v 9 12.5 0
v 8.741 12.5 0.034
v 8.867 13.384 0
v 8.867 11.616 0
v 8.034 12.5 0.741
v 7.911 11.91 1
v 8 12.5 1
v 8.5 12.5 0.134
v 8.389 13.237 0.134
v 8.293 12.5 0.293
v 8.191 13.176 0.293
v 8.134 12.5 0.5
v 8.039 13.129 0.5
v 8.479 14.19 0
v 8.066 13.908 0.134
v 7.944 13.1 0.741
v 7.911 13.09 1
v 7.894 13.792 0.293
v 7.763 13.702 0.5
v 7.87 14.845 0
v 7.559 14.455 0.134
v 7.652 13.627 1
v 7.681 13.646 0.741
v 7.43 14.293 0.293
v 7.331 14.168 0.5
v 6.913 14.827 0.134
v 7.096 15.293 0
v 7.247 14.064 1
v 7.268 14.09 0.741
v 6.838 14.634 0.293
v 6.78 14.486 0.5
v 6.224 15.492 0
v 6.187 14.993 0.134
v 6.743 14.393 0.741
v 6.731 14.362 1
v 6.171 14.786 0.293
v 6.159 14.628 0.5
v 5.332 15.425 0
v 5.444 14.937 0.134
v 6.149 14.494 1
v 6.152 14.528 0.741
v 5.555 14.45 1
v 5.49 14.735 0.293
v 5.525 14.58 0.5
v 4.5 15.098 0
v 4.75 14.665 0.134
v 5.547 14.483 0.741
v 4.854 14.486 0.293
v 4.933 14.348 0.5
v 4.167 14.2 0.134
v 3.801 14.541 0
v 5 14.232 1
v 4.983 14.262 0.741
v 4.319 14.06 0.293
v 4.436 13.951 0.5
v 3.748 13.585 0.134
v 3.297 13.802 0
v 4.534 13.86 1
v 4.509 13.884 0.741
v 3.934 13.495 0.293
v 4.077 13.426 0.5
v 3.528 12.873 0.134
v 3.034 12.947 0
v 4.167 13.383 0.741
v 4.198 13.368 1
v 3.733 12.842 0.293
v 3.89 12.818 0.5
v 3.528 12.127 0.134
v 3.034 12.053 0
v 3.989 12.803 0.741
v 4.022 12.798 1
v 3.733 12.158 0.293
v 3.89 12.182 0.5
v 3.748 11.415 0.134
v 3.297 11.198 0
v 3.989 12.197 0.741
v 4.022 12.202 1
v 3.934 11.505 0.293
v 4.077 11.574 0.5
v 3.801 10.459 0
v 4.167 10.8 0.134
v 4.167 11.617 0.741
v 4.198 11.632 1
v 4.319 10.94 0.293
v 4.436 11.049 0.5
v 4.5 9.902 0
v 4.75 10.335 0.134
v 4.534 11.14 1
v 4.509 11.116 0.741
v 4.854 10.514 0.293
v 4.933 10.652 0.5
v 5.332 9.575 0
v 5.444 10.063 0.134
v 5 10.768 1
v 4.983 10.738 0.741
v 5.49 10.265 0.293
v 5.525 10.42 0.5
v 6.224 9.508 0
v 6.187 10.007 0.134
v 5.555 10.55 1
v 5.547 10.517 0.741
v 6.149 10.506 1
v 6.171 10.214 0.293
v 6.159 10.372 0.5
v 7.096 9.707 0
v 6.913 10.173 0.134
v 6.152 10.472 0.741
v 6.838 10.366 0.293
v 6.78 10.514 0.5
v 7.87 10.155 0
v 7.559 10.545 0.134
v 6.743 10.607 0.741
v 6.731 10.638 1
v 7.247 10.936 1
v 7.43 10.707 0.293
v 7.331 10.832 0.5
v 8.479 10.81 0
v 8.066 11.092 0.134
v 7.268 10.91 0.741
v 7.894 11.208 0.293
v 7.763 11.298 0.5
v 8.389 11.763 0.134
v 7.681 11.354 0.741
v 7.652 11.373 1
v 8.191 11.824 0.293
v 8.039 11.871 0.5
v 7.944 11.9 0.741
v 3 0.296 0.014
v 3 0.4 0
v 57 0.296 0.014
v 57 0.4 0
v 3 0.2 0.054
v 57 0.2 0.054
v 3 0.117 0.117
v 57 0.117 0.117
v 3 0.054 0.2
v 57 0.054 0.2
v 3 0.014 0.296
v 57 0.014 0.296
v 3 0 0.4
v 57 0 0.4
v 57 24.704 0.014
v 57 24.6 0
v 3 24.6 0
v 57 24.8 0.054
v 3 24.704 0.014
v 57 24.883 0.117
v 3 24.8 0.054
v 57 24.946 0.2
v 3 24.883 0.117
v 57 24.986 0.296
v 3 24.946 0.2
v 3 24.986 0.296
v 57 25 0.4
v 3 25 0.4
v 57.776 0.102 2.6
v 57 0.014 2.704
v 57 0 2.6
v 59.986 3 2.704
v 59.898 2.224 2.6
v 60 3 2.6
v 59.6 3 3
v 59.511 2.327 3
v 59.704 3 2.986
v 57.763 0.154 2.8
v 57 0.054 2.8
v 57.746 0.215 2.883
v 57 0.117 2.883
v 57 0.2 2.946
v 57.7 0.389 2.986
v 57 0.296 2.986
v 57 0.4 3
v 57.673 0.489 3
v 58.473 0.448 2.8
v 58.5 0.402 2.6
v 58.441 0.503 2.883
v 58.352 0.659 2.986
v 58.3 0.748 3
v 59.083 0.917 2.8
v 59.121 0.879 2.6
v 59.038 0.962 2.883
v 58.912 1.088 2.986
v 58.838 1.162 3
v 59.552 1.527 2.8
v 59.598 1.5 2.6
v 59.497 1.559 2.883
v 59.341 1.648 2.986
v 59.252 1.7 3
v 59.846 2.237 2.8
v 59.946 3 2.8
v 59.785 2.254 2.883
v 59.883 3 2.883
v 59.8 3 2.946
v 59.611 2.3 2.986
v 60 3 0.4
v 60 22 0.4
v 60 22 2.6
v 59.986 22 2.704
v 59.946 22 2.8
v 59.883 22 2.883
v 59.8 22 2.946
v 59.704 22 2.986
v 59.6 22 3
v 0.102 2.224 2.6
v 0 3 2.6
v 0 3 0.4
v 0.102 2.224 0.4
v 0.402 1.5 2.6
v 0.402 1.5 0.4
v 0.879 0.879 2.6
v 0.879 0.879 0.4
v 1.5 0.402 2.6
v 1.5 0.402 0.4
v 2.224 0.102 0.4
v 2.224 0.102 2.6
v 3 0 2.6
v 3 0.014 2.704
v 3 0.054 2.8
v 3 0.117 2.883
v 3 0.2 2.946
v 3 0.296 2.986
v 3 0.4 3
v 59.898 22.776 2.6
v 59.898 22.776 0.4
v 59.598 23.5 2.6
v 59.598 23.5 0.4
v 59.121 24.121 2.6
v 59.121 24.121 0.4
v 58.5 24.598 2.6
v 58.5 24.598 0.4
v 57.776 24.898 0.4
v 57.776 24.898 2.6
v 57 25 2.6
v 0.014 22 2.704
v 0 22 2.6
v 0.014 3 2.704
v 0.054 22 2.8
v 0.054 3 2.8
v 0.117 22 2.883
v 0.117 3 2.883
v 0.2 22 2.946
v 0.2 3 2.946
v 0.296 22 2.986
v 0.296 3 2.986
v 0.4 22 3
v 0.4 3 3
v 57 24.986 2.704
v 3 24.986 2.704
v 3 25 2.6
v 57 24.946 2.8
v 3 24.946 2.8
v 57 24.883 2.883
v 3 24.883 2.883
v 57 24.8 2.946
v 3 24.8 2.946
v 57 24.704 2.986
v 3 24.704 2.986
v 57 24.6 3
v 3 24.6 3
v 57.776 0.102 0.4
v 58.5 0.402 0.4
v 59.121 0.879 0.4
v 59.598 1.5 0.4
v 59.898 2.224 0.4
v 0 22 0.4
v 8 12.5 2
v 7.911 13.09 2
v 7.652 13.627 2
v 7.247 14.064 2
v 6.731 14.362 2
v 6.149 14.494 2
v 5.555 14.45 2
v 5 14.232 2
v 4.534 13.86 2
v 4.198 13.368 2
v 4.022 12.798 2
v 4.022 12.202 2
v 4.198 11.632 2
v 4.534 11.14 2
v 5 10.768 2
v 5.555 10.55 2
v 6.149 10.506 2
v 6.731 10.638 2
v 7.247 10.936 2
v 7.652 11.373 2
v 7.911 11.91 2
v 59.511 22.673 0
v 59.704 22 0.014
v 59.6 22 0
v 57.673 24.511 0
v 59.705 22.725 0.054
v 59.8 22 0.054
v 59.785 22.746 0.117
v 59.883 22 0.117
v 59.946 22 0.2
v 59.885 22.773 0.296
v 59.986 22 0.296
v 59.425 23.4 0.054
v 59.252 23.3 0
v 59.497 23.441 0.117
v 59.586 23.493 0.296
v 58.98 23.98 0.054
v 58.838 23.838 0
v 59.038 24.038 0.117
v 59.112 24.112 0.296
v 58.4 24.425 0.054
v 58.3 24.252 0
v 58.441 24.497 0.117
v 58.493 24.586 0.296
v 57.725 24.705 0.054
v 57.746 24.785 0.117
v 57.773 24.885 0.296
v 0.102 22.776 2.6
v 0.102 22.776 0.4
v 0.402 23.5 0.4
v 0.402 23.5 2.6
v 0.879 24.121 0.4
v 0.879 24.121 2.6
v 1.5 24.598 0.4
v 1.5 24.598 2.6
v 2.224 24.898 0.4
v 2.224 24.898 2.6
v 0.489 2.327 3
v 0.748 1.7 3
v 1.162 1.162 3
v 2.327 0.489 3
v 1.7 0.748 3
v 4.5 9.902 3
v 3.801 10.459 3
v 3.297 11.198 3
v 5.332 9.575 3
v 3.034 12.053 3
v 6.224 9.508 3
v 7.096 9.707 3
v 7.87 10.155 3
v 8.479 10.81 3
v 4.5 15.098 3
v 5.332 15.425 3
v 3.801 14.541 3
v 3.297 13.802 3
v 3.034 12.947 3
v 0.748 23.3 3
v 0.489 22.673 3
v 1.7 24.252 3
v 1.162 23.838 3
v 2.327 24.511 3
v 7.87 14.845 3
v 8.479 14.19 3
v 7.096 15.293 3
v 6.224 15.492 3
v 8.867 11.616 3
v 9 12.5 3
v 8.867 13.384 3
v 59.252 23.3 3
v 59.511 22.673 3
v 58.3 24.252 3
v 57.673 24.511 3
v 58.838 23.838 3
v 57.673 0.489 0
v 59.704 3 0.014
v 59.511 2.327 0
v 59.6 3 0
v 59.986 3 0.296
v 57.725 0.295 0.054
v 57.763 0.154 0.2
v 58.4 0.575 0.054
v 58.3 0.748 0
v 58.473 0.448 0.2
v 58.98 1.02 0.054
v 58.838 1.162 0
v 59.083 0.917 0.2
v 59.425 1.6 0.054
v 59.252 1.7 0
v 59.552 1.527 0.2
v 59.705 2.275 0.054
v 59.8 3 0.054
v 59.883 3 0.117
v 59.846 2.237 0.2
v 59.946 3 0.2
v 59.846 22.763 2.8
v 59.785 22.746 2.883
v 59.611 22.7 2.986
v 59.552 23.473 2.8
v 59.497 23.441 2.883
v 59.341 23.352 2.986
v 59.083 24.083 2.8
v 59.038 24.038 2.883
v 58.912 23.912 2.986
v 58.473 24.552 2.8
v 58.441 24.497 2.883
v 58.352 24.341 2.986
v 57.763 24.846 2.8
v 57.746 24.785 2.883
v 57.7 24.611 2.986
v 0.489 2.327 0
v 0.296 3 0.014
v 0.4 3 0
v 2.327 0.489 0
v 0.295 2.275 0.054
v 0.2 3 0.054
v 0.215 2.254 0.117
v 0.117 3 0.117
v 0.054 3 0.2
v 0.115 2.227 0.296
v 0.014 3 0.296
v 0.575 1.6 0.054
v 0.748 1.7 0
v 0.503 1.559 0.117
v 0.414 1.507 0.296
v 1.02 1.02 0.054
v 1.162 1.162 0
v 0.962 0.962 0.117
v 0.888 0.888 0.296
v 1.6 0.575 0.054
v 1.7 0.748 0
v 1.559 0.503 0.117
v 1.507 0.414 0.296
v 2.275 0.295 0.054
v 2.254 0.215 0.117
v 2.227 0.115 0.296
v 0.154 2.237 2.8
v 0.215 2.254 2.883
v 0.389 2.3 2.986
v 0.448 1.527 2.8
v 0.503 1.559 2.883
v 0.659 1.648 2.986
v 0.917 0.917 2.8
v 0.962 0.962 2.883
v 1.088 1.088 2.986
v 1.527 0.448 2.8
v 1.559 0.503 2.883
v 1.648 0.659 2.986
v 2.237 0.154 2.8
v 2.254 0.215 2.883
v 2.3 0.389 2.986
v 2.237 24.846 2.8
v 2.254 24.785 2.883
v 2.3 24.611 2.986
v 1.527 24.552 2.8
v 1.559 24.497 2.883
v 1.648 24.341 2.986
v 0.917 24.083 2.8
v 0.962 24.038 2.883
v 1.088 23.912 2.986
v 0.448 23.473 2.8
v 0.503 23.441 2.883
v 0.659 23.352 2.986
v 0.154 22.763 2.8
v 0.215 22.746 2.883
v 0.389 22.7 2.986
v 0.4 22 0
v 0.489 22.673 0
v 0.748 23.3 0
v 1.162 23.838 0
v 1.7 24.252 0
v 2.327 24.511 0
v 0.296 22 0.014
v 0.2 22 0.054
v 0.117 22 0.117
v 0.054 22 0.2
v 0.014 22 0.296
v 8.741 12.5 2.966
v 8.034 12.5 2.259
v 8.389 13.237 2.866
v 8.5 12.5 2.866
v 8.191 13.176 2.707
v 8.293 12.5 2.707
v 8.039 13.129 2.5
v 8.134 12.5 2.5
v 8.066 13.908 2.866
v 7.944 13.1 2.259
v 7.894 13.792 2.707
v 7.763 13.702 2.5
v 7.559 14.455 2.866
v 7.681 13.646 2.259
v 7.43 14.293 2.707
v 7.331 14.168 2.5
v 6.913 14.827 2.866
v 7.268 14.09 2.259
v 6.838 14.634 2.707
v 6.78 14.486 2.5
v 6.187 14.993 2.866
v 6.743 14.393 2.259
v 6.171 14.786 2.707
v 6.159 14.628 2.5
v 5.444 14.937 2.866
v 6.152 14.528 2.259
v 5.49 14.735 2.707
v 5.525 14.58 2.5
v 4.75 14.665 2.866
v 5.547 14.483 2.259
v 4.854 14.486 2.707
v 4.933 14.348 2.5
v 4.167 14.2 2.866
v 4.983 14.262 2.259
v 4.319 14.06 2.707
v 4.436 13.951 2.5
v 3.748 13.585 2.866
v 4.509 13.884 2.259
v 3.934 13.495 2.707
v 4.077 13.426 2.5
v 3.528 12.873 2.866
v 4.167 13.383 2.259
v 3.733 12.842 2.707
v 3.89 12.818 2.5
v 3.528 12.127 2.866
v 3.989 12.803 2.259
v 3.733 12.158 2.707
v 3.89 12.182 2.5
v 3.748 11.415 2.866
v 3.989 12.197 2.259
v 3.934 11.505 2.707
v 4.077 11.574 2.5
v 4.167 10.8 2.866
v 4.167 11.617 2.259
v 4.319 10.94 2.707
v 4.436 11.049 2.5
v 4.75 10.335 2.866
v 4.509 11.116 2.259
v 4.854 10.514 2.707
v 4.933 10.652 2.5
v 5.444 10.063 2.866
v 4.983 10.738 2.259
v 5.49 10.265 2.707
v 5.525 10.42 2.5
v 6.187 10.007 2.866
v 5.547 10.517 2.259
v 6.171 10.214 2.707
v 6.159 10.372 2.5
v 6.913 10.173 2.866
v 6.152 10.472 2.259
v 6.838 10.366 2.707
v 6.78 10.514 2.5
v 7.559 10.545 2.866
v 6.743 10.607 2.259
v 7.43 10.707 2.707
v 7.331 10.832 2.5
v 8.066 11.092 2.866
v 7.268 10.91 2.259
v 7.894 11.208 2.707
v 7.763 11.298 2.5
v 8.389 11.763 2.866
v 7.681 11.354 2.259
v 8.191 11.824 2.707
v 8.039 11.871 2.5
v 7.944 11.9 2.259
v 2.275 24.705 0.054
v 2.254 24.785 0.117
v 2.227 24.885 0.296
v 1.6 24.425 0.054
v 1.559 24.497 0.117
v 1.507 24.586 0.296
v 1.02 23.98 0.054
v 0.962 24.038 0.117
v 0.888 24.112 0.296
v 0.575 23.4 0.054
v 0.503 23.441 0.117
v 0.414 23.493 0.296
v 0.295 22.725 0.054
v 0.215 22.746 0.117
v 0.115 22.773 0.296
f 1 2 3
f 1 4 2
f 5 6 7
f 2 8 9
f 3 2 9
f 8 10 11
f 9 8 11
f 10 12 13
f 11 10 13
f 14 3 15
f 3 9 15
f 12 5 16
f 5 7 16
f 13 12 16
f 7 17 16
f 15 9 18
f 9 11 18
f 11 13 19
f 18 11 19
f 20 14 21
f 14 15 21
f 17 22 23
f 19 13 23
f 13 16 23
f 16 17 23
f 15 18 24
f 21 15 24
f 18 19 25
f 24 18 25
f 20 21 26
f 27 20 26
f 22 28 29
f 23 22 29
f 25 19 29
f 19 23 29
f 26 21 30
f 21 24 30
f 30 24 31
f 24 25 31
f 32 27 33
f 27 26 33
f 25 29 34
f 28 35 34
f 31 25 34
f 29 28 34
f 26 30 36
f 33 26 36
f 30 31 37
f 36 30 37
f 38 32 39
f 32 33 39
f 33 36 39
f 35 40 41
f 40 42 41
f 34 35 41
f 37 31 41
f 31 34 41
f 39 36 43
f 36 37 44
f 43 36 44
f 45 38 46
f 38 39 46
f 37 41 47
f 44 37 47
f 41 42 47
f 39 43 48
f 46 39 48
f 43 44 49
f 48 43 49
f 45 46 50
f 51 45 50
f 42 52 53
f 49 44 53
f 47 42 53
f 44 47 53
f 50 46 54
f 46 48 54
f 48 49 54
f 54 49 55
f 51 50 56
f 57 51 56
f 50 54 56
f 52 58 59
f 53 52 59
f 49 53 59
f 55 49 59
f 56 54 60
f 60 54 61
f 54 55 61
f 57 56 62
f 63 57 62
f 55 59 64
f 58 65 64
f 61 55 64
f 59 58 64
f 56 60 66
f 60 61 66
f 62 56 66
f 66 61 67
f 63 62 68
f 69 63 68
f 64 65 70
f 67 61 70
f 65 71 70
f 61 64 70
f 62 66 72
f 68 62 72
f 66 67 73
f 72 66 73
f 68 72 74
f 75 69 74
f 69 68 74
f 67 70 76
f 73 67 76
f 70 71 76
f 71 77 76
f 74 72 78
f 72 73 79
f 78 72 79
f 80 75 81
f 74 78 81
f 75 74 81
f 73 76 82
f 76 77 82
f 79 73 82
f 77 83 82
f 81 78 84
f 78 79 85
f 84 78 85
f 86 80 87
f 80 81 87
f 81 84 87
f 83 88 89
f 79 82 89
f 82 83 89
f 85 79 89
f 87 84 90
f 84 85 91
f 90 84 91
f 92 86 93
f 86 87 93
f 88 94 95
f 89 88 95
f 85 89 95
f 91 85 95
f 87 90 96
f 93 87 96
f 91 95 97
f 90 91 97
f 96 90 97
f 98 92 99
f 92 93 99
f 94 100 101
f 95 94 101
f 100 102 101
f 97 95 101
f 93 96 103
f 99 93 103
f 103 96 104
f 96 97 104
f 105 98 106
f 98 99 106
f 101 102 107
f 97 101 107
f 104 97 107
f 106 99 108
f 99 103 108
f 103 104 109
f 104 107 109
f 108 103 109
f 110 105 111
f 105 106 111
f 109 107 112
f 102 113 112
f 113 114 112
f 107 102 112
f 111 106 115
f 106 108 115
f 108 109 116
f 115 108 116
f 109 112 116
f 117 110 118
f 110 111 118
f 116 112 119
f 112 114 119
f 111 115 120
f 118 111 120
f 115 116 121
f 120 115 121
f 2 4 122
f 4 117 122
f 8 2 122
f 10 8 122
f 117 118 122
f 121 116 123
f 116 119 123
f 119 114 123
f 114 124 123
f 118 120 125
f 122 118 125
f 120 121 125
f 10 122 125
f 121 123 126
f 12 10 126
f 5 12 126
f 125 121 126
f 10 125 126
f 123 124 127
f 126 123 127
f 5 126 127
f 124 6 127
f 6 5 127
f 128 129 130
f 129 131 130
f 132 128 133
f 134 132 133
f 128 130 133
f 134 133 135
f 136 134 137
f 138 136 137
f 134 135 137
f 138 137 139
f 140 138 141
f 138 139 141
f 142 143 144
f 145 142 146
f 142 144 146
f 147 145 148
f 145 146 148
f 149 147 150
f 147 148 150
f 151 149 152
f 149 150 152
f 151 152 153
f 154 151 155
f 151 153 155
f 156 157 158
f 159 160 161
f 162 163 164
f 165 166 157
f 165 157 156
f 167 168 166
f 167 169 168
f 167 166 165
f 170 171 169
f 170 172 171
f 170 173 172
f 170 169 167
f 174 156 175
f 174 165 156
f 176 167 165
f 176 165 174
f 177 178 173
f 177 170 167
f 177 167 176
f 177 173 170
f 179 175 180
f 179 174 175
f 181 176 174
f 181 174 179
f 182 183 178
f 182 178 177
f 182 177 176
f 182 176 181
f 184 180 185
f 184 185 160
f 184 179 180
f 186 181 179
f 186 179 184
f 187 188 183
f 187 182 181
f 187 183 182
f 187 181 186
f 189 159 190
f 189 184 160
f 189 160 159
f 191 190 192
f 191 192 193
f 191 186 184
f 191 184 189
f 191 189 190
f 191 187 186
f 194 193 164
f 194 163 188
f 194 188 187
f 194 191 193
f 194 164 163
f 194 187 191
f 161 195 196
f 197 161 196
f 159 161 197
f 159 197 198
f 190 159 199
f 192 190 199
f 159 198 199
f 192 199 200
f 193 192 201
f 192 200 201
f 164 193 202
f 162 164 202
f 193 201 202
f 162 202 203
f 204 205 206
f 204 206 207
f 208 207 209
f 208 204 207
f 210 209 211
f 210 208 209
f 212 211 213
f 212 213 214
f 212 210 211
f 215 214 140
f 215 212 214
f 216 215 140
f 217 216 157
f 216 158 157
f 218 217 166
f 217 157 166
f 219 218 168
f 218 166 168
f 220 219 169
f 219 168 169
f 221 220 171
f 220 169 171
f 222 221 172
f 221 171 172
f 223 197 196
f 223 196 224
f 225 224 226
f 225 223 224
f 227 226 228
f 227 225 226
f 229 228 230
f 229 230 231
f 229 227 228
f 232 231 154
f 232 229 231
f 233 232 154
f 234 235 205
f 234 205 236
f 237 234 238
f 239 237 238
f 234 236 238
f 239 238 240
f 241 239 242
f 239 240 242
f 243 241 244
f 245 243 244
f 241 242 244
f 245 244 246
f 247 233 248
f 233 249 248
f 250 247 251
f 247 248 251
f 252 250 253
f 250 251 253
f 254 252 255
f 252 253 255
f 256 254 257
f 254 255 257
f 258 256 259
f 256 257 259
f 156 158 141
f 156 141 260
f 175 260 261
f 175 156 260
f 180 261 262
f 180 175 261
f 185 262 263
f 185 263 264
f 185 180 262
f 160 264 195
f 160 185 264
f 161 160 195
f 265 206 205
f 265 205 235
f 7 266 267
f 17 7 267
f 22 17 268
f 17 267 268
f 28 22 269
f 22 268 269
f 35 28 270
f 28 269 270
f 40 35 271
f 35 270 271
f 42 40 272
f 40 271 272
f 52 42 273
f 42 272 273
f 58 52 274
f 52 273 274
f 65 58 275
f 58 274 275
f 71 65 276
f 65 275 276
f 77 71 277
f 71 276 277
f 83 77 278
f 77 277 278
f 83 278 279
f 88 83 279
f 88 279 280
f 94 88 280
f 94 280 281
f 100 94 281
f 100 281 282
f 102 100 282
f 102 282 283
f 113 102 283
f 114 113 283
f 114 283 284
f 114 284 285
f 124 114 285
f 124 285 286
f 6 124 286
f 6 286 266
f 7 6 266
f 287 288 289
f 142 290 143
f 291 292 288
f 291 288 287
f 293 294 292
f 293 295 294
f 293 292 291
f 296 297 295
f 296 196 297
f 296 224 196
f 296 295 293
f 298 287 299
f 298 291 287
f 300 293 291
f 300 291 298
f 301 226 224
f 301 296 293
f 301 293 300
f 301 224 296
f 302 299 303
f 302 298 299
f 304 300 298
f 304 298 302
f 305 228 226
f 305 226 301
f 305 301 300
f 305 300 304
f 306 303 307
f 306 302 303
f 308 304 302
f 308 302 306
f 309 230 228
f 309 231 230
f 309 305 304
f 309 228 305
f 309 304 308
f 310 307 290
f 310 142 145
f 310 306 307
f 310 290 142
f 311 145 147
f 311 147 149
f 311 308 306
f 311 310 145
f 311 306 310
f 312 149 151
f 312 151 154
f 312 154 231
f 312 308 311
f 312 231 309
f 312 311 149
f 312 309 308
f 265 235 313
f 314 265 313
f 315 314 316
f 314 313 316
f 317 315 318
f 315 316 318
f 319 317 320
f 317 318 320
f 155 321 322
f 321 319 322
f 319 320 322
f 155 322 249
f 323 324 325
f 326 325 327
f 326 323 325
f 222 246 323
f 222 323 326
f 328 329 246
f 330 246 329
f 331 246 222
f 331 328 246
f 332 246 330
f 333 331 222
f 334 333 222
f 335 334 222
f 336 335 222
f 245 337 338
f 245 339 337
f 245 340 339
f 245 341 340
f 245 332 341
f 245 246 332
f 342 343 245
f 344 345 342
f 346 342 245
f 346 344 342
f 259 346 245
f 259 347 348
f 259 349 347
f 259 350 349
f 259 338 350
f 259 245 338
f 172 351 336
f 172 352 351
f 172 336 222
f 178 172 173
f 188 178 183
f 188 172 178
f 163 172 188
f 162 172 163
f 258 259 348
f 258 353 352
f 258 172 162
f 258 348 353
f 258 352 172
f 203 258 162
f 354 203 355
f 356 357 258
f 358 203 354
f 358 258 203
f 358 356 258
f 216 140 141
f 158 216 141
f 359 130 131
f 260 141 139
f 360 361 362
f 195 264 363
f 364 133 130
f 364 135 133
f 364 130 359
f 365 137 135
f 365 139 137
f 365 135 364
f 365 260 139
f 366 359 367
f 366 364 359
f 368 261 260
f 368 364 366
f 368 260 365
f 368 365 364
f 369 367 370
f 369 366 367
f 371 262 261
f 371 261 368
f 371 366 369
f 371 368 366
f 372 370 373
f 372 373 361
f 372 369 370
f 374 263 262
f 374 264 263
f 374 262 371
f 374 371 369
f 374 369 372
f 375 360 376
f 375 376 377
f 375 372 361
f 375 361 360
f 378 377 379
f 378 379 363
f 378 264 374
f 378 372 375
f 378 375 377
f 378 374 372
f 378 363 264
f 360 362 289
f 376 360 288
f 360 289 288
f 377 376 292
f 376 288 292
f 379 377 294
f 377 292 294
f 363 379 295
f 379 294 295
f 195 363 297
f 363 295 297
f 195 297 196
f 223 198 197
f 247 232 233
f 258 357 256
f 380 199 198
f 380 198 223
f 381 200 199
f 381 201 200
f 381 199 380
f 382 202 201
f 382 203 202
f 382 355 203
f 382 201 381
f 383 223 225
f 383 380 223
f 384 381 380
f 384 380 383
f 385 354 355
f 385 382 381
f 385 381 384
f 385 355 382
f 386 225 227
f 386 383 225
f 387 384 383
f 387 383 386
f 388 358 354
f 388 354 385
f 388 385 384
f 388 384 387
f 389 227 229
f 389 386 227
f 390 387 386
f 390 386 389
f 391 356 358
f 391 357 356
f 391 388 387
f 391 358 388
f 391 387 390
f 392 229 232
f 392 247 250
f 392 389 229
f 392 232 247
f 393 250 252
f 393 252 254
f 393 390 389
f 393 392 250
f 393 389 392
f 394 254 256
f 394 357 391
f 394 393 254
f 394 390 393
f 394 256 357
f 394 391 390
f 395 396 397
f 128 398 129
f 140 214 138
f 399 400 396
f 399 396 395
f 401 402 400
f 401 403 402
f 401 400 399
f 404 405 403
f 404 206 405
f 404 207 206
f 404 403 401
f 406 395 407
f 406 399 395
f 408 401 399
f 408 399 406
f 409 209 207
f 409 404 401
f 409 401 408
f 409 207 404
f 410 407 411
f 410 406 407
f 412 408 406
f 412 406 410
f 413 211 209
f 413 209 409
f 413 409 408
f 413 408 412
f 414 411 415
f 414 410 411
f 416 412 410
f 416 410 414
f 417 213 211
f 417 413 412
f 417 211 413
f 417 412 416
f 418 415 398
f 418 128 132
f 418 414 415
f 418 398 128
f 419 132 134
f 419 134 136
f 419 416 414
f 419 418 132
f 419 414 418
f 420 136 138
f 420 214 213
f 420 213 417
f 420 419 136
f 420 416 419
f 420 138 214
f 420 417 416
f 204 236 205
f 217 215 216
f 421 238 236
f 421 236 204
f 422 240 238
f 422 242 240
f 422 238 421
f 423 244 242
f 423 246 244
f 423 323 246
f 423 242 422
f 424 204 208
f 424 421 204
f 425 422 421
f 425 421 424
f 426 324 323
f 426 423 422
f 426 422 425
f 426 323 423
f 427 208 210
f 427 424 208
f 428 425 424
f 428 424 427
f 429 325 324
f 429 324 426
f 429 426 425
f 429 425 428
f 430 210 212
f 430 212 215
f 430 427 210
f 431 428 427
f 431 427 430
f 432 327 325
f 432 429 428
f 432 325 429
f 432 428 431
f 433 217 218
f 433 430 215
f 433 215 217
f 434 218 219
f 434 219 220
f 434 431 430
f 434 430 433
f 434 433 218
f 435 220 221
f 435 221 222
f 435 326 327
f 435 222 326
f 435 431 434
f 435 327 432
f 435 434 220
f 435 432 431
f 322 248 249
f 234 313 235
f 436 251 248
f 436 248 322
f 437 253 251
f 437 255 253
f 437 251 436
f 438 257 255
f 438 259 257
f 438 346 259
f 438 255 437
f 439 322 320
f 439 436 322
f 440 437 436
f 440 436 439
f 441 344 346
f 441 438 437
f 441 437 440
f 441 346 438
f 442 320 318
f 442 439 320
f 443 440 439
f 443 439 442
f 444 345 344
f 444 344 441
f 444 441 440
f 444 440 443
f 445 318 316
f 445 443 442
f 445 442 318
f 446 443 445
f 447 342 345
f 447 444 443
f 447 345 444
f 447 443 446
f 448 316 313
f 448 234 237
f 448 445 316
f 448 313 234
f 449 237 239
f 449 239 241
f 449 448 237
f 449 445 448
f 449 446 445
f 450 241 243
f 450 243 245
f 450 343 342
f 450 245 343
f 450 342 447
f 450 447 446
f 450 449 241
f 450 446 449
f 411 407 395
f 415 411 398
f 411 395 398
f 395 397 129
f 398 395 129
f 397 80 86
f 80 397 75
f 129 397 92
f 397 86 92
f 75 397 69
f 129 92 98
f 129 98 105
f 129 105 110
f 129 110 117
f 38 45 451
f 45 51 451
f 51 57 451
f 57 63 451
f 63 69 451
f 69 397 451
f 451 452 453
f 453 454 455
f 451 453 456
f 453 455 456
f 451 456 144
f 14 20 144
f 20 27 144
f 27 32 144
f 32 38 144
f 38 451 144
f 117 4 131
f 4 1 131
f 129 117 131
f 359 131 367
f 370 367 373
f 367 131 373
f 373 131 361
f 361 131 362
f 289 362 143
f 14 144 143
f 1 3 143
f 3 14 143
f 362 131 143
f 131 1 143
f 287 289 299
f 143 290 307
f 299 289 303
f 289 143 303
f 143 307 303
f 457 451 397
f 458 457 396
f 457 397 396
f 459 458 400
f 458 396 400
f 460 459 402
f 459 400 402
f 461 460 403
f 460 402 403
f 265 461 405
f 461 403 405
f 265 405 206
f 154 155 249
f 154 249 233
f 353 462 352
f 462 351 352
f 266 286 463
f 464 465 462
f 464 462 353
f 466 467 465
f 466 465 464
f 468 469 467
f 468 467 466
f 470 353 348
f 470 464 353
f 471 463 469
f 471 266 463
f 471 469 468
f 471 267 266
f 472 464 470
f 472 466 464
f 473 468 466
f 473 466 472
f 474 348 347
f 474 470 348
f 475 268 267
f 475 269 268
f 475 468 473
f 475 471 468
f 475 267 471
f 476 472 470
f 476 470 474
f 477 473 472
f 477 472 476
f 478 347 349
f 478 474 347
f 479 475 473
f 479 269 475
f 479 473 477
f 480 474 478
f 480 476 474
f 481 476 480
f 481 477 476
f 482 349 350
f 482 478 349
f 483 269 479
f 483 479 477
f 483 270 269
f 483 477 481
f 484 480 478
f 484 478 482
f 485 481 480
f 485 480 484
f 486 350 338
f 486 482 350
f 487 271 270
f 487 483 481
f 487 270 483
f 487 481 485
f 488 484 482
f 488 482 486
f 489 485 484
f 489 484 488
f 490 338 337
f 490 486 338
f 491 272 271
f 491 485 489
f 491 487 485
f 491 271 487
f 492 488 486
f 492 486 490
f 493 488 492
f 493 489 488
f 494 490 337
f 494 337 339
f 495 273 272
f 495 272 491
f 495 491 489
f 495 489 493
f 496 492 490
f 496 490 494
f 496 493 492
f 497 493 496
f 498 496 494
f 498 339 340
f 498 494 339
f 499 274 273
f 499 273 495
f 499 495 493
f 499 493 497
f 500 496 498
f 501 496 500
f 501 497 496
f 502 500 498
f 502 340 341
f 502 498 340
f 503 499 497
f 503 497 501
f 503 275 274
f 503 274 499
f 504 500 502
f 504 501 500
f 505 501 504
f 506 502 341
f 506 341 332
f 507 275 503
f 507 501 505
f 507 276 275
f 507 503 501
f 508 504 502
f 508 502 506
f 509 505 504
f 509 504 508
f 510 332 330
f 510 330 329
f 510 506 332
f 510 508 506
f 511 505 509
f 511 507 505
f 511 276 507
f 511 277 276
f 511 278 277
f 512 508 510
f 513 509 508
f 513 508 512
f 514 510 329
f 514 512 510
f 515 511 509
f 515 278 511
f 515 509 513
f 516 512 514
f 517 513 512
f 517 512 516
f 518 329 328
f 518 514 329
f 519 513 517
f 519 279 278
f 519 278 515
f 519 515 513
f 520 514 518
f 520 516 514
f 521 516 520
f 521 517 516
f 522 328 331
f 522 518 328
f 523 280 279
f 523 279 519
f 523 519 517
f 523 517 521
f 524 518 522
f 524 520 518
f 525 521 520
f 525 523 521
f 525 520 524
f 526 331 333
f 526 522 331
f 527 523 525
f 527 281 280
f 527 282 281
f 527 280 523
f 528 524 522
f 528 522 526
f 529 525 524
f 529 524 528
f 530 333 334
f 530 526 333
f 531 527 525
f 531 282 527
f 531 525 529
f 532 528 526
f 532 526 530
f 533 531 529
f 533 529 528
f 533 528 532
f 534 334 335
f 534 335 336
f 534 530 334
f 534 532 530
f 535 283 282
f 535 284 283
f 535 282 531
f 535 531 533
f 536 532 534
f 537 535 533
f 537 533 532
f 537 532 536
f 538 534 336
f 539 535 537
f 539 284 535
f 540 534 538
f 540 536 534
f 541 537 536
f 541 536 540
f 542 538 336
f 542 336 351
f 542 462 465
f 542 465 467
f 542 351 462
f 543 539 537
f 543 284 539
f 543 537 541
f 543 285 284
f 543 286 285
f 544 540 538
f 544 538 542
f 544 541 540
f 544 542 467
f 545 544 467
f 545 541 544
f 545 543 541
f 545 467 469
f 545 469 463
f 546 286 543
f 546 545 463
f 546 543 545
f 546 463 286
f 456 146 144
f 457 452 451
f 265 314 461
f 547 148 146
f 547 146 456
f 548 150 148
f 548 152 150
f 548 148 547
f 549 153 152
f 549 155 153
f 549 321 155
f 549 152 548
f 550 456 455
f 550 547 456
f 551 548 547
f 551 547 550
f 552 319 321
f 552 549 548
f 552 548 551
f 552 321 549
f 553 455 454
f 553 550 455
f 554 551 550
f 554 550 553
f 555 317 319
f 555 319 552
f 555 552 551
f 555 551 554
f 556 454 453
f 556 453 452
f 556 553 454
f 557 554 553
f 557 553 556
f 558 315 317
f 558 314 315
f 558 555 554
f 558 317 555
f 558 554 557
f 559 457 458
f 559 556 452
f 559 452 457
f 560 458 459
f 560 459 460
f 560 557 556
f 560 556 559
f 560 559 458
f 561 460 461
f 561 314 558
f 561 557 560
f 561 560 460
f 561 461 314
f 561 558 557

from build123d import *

# Parameters (mm, degrees)
SKETCH_W      = 60
SKETCH_H      = 25
EXTRUDE_DEPTH = 3
FILLET_R      = 3
SKETCH001_R   = 2
POCKET_DEPTH  = 3.001
FILLET001_R   = 1
FILLET002_R   = 0.4


with BuildPart() as part:
    # Sketch (on Sketch) → Extrude (new body)
    with BuildSketch(Plane.XY):
        with Locations((30, 12.5)):
            Rectangle(SKETCH_W, SKETCH_H)
    extrude(amount=EXTRUDE_DEPTH)

    # Fillet
    fillet_edges = [part.edges().sort_by_distance(p)[0] for p in [
        (0, 25, 1.5),
        (0, 0, 1.5),
        (60, 0, 1.5),
        (60, 25, 1.5),
    ]]
    fillet(fillet_edges, radius=FILLET_R)

    # Sketch001 (on Face5 of Fillet) → Pocket (cut, through all)
    with BuildSketch(Plane.XY.offset(3)):
        with Locations((6, 12.5)):
            Circle(SKETCH001_R)
    extrude(amount=-POCKET_DEPTH, mode=Mode.SUBTRACT)

    # Fillet001
    fillet001_edges = [part.edges().sort_by_distance(p)[0] for p in [
        (4, 12.5, 3),
        (4, 12.5, 0),
    ]]
    fillet(fillet001_edges, radius=FILLET001_R)

    # Fillet002
    fillet002_edges = [part.edges().sort_by_distance(p)[0] for p in [
        (60, 12.5, 3),
        (59.12132, 24.12132, 3),
        (30, 25, 3),
        (0.87868, 24.12132, 3),
        (0, 12.5, 3),
        (0.87868, 0.87868, 3),
        (30, 0, 3),
        (59.12132, 0.87868, 3),
        (59.12132, 0.87868, 0),
        (30, 0, 0),
        (0.87868, 0.87868, 0),
        (0, 12.5, 0),
        (0.87868, 24.12132, 0),
        (30, 25, 0),
        (59.12132, 24.12132, 0),
        (60, 12.5, 0),
    ]]
    fillet(fillet002_edges, radius=FILLET002_R)


solid = part.part
